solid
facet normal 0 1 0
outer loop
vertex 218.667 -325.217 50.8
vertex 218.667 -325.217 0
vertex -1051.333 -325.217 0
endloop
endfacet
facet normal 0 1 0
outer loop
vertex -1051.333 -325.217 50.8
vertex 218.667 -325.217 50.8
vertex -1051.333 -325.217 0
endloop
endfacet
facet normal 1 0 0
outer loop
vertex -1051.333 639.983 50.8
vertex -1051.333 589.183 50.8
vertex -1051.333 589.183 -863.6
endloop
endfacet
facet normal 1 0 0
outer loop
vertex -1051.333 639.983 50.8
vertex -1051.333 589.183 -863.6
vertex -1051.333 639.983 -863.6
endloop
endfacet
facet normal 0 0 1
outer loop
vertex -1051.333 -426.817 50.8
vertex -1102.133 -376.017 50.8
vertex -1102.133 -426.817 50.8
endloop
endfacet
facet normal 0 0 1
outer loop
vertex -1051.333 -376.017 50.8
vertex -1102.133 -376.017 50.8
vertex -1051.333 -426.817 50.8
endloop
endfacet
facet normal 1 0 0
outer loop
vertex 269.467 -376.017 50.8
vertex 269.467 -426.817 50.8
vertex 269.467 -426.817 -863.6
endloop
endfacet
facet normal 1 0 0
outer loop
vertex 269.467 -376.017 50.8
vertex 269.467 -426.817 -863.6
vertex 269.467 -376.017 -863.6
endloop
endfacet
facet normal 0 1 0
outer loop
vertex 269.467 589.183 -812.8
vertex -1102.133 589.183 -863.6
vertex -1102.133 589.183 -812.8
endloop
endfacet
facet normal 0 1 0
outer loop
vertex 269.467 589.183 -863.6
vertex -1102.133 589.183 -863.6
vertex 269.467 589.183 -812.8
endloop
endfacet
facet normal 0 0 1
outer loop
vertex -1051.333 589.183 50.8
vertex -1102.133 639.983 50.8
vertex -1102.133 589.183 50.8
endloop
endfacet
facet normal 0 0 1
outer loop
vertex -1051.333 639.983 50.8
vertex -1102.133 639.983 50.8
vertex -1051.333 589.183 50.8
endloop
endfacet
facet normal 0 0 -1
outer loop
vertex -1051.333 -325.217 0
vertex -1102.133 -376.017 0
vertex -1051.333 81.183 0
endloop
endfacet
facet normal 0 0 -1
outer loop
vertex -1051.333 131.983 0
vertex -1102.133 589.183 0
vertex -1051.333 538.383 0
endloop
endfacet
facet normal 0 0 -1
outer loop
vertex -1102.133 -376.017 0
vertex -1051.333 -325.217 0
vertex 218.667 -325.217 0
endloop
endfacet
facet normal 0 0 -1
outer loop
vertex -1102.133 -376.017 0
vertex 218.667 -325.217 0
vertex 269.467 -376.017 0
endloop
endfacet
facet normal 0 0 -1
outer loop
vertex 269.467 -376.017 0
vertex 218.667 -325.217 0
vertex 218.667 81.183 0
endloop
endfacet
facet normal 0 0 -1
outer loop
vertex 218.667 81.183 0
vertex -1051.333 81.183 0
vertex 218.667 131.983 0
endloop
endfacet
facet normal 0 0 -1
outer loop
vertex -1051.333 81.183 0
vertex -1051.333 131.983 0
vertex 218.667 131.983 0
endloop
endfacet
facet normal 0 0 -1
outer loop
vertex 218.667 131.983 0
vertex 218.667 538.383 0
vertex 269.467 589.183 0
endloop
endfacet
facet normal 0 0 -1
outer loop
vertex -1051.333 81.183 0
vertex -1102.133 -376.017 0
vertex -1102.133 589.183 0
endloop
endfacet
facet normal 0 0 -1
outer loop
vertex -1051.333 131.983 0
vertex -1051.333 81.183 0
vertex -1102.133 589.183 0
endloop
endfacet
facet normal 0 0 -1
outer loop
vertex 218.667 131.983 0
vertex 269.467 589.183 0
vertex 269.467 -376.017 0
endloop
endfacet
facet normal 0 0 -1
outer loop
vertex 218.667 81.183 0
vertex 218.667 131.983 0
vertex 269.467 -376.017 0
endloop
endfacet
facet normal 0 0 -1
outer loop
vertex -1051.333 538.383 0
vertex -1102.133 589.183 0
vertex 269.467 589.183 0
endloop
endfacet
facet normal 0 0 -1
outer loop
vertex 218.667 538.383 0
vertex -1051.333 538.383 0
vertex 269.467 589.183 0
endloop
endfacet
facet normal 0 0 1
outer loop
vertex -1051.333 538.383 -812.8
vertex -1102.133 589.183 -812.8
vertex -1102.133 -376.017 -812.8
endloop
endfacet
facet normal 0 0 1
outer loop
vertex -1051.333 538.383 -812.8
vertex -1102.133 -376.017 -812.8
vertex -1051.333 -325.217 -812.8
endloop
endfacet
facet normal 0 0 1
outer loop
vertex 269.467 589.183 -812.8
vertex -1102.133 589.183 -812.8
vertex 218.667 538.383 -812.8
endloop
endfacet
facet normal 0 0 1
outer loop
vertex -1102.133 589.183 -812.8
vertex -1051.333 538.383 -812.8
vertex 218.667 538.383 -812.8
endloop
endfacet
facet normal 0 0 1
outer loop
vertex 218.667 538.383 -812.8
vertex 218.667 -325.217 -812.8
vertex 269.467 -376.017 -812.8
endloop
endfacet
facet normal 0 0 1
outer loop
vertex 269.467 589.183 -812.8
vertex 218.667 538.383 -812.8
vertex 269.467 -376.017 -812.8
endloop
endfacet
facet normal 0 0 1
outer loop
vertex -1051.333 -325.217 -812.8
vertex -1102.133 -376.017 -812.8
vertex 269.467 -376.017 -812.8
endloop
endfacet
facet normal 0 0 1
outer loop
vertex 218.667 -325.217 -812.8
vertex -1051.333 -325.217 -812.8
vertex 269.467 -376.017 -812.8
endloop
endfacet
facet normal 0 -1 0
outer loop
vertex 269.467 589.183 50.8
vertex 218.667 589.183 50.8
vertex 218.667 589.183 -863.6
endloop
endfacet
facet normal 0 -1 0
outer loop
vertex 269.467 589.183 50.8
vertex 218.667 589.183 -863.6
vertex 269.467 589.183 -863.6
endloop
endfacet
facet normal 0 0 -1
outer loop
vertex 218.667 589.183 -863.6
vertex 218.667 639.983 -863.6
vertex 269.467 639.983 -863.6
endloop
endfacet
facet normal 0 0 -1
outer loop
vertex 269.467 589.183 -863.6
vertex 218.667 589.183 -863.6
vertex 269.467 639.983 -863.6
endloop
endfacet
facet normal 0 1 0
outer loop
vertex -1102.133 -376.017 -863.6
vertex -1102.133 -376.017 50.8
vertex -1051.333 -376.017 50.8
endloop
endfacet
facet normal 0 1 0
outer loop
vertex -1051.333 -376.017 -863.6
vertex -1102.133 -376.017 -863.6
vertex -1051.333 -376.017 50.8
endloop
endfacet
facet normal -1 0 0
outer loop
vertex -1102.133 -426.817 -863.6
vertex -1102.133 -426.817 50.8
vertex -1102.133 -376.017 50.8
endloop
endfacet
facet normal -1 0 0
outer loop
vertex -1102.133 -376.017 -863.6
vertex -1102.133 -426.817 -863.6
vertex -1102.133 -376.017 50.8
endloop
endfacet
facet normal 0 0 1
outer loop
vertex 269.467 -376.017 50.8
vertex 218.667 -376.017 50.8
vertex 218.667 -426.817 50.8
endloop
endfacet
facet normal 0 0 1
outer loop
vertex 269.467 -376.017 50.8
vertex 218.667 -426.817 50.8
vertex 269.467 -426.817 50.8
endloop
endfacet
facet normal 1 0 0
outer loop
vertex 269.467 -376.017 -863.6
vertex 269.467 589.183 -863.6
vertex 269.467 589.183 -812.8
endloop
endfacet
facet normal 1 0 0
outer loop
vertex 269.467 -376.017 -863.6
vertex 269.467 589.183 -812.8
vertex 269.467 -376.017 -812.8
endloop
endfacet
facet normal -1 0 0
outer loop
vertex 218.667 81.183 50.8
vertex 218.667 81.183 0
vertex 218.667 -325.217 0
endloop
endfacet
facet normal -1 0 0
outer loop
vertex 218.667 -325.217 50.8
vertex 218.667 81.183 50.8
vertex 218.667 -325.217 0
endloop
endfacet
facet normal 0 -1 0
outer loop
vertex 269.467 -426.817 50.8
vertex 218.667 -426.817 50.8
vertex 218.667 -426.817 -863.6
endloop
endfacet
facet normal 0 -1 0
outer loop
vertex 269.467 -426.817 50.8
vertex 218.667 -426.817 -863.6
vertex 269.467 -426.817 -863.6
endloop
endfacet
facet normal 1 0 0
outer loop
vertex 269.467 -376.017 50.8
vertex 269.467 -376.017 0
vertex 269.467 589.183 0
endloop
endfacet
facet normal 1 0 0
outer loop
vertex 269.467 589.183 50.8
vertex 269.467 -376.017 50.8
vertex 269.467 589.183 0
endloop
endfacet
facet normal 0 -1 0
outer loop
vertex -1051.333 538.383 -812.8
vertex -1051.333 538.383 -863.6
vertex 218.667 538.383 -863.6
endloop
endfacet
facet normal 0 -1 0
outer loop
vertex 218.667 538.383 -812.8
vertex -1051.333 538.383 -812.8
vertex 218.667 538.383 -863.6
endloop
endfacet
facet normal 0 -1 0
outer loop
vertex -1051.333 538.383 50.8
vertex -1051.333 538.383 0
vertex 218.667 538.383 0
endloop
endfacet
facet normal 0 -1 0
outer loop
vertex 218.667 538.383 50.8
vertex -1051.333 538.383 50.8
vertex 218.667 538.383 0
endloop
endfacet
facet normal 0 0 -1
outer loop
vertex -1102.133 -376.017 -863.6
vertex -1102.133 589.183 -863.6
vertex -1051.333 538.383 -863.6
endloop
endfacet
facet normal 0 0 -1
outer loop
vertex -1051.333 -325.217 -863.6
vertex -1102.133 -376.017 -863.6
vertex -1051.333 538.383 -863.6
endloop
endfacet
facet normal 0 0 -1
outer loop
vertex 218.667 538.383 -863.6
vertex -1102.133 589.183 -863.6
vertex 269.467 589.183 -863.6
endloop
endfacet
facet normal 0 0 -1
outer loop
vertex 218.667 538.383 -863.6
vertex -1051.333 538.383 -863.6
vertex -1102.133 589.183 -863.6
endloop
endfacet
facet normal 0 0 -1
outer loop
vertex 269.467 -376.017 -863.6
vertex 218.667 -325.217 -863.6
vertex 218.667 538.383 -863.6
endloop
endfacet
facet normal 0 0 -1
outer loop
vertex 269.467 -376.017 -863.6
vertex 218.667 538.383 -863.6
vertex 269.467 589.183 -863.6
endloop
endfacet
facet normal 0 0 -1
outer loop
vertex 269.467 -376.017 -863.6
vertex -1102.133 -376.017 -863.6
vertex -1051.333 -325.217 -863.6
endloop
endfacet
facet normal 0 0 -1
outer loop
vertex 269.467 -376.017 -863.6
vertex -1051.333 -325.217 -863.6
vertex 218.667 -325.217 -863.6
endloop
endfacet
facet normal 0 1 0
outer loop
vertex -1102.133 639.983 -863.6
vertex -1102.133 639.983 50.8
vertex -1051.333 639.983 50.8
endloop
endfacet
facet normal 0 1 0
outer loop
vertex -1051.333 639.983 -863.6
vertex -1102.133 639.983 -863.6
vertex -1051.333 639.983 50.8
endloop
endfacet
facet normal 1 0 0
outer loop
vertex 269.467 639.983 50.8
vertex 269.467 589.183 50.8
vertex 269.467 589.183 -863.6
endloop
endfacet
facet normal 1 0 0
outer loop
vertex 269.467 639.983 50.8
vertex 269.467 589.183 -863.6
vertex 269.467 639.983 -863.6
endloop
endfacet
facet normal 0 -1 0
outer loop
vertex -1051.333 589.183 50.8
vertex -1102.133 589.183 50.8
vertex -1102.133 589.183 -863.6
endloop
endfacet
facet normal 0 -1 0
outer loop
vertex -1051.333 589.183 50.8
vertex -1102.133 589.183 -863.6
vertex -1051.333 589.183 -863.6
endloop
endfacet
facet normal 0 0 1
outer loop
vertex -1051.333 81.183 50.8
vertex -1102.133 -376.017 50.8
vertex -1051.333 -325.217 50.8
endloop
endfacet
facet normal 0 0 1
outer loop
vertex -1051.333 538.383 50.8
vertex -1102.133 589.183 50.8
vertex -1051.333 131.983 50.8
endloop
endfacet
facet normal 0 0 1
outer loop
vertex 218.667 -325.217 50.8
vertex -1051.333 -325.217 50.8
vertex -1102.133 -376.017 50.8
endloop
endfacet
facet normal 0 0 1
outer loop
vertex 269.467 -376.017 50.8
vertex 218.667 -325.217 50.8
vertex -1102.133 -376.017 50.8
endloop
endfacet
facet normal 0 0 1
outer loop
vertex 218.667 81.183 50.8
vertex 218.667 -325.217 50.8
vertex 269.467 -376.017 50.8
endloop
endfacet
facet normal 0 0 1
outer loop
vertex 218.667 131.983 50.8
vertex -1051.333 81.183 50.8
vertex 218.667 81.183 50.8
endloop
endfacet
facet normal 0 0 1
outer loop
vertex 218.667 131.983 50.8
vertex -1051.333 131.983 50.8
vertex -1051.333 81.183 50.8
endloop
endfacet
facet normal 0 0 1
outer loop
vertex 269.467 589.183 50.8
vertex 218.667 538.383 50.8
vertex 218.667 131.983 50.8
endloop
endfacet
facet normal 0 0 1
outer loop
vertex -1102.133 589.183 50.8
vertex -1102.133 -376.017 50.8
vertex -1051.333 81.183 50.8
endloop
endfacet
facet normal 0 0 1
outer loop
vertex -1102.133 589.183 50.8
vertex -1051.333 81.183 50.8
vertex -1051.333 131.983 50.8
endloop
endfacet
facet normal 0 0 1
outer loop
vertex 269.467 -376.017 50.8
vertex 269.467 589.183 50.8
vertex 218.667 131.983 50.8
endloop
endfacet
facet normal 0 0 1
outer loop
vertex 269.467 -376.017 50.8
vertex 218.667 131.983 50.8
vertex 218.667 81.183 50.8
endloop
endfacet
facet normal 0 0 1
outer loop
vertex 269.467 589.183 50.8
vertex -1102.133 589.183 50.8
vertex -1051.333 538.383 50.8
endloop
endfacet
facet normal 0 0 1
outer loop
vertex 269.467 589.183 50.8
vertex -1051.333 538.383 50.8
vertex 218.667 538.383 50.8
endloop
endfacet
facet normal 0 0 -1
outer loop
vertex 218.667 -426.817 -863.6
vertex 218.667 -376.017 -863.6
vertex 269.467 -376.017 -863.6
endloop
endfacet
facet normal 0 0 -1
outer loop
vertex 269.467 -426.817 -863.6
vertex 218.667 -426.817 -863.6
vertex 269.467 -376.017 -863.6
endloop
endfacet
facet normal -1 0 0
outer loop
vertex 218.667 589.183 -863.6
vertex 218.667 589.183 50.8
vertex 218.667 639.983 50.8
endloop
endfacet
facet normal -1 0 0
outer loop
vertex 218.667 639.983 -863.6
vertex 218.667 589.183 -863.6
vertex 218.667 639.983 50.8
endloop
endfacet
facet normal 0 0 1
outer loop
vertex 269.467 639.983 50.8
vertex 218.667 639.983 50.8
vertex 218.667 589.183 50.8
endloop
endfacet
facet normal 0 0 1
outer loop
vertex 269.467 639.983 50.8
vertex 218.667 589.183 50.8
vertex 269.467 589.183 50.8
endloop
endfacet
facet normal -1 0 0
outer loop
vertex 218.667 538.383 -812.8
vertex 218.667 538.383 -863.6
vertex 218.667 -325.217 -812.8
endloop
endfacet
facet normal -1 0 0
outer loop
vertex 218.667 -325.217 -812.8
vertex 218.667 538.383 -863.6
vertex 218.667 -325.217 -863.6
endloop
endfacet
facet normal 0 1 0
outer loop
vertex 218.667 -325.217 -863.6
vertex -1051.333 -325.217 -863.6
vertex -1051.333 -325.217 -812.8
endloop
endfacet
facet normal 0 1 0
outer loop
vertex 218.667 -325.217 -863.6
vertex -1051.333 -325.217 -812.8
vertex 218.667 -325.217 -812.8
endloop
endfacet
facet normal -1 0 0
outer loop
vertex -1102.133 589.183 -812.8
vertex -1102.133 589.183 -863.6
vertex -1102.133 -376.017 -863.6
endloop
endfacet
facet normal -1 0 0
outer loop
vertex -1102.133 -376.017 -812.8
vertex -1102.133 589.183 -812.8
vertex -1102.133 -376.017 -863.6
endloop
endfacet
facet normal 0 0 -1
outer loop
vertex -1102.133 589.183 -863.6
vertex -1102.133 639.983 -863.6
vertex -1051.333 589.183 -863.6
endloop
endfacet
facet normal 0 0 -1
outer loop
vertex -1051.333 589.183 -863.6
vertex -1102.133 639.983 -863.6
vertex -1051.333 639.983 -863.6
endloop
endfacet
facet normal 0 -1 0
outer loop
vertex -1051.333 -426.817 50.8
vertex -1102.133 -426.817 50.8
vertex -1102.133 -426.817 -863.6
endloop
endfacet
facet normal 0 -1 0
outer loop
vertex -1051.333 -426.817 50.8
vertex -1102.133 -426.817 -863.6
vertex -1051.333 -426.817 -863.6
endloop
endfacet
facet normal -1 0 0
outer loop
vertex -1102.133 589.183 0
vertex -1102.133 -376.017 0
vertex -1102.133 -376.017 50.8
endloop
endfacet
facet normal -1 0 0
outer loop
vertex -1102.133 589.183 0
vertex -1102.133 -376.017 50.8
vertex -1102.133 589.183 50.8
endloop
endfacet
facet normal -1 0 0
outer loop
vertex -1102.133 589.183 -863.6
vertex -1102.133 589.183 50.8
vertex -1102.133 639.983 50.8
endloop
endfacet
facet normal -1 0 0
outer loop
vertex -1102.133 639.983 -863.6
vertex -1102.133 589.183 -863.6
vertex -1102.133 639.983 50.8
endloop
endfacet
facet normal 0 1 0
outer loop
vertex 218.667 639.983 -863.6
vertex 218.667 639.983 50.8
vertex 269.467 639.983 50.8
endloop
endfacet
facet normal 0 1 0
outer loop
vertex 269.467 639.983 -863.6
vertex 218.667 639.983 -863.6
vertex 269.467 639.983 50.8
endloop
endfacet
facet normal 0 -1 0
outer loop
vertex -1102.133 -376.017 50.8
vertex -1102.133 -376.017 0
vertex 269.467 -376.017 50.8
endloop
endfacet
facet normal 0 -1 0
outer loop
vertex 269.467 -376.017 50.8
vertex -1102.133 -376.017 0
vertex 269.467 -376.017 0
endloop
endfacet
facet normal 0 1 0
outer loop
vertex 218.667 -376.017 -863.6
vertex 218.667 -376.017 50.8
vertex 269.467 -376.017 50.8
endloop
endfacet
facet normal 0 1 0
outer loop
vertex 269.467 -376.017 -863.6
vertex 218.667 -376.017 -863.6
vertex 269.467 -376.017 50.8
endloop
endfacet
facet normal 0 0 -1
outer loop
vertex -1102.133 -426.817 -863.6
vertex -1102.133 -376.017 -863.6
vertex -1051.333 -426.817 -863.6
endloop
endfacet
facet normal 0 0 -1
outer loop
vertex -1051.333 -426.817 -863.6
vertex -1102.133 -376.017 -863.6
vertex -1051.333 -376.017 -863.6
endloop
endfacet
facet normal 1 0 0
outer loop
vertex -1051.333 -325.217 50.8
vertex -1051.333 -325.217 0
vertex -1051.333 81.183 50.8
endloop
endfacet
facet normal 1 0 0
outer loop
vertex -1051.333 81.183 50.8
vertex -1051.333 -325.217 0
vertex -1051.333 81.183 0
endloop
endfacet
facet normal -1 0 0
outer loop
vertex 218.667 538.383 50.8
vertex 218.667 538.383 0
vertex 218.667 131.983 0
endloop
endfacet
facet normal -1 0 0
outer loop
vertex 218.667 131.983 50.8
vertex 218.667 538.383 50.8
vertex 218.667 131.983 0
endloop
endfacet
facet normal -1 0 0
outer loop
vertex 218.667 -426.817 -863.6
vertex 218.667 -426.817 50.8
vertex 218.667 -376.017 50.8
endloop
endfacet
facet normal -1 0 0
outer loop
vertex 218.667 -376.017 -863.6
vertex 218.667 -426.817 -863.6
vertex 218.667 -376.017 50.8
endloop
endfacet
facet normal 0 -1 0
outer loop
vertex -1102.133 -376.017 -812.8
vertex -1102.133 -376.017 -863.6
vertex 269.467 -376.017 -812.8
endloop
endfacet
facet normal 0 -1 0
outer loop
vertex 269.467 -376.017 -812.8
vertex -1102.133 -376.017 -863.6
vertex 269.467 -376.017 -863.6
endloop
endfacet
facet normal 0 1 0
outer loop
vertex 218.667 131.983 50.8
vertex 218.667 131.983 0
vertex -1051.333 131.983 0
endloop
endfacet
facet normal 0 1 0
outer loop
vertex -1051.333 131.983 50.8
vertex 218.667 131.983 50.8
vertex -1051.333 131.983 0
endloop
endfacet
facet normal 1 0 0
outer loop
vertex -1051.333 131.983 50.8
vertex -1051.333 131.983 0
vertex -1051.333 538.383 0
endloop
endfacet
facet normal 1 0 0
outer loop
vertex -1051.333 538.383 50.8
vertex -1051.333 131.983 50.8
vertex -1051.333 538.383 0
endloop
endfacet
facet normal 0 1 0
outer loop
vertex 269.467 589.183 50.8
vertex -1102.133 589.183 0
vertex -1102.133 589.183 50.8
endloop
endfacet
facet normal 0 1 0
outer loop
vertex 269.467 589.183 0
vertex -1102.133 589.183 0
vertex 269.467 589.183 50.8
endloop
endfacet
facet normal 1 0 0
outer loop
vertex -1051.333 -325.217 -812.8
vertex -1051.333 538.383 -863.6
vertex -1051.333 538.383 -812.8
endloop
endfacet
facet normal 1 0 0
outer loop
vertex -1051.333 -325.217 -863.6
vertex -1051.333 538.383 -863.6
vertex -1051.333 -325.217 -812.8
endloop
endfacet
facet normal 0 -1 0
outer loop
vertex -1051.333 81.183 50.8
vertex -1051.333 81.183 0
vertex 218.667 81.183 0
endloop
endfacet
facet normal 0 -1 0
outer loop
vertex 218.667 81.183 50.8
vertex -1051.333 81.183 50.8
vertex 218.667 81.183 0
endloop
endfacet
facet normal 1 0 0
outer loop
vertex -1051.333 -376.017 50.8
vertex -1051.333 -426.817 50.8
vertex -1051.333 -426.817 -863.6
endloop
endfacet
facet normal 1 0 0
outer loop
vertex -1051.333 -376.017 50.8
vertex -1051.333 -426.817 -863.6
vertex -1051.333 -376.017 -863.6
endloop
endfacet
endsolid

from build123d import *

# Parameters (mm, degrees)
F0_W     = 1371.6
F0_H     = 965.2
F0_W_2   = 260.35
F0_H_2   = 25.4
F0_W_3   = 234.95
F0_W_4   = 254
F1_DEPTH = 50.8
F2_W     = 50.8
F2_H     = 50.8
F3_DEPTH = 914.4
F4_W     = 1371.6
F4_H     = 965.2
F4_W_2   = 1270
F4_H_2   = 863.6
F5_DEPTH = 50.8


with BuildPart() as f1:
    # F0 (on Top) → F1 (new body)
    with BuildSketch(Plane.XY):
        with Locations((-416.3326116403, 106.5828682661)):
            Rectangle(F0_W, F0_H)
        Polygon((-816.3826116403, -350.6171317339), (-1076.7326116403, -350.6171317339), (-1076.7326116403, -122.0171317339), (-1076.7326116403, 106.5828682661), (-1076.7326116403, 335.1828682661), (-1076.7326116403, 563.7828682661), (-816.3826116403, 563.7828682661), (-556.0326116403, 563.7828682661), (-295.6826116403, 563.7828682661), (-35.3326116403, 563.7828682661), (244.0673883597, 563.7828682661), (244.0673883597, 335.1828682661), (244.0673883597, 106.5828682661), (244.0673883597, -122.0171317339), (244.0673883597, -350.6171317339), (-35.3326116403, -350.6171317339), (-295.6826116403, -350.6171317339), (-556.0326116403, -350.6171317339), align=None, mode=Mode.SUBTRACT)
        Polygon((-1076.7326116403, -122.0171317339), (-1076.7326116403, -350.6171317339), (-816.3826116403, -350.6171317339), (-816.3826116403, -325.2171317339), (-1051.3326116403, -325.2171317339), (-1051.3326116403, -122.0171317339), (-1051.3326116403, 81.1828682661), (-1051.3326116403, 106.5828682661), (-1051.3326116403, 131.9828682661), (-1051.3326116403, 335.1828682661), (-1051.3326116403, 538.3828682661), (-816.3826116403, 538.3828682661), (-556.0326116403, 538.3828682661), (-295.6826116403, 538.3828682661), (-35.3326116403, 538.3828682661), (218.6673883597, 538.3828682661), (218.6673883597, 335.1828682661), (218.6673883597, 131.9828682661), (218.6673883597, 106.5828682661), (244.0673883597, 106.5828682661), (244.0673883597, 335.1828682661), (244.0673883597, 563.7828682661), (-35.3326116403, 563.7828682661), (-295.6826116403, 563.7828682661), (-556.0326116403, 563.7828682661), (-816.3826116403, 563.7828682661), (-1076.7326116403, 563.7828682661), (-1076.7326116403, 335.1828682661), (-1076.7326116403, 106.5828682661), align=None)
        Polygon((-295.6826116403, -325.2171317339), (-295.6826116403, -350.6171317339), (-35.3326116403, -350.6171317339), (244.0673883597, -350.6171317339), (244.0673883597, -122.0171317339), (244.0673883597, 106.5828682661), (218.6673883597, 106.5828682661), (218.6673883597, 81.1828682661), (218.6673883597, -122.0171317339), (218.6673883597, -325.2171317339), (-35.3326116403, -325.2171317339), align=None)
        with Locations((-425.8576116403, -337.9171317339)):
            Rectangle(F0_W_2, F0_H_2)
        with Locations((-686.2076116403, -337.9171317339)):
            Rectangle(F0_W_2, F0_H_2)
        with Locations((-933.8576116403, 119.2828682661)):
            Rectangle(F0_W_3, F0_H_2)
        with Locations((-686.2076116403, 119.2828682661)):
            Rectangle(F0_W_2, F0_H_2)
        with Locations((-425.8576116403, 119.2828682661)):
            Rectangle(F0_W_2, F0_H_2)
        with Locations((-165.5076116403, 119.2828682661)):
            Rectangle(F0_W_2, F0_H_2)
        with Locations((91.6673883597, 119.2828682661)):
            Rectangle(F0_W_4, F0_H_2)
        with Locations((-933.8576116403, 93.8828682661)):
            Rectangle(F0_W_3, F0_H_2)
        with Locations((-686.2076116403, 93.8828682661)):
            Rectangle(F0_W_2, F0_H_2)
        with Locations((-425.8576116403, 93.8828682661)):
            Rectangle(F0_W_2, F0_H_2)
        with Locations((-165.5076116403, 93.8828682661)):
            Rectangle(F0_W_2, F0_H_2)
        with Locations((91.6673883597, 93.8828682661)):
            Rectangle(F0_W_4, F0_H_2)
    extrude(amount=F1_DEPTH)


with BuildPart() as f3:
    # F2 (on face) → F3 (new body)
    with BuildSketch(Plane.XY.offset(50.8)):
        with Locations((244.0673883597, 614.5828682661)):
            Rectangle(F2_W, F2_H)
    extrude(amount=-F3_DEPTH)


with BuildPart() as f3b:
    # F2 (on face) → F3, piece 2 (new body)
    with BuildSketch(Plane.XY.offset(50.8)):
        with Locations((-1076.7326116403, -401.4171317339)):
            Rectangle(F2_W, F2_H)
    extrude(amount=-F3_DEPTH)


with BuildPart() as f3c:
    # F2 (on face) → F3, piece 3 (new body)
    with BuildSketch(Plane.XY.offset(50.8)):
        with Locations((244.0673883597, -401.4171317339)):
            Rectangle(F2_W, F2_H)
    extrude(amount=-F3_DEPTH)


with BuildPart() as f3d:
    # F2 (on face) → F3, piece 4 (new body)
    with BuildSketch(Plane.XY.offset(50.8)):
        with Locations((-1076.7326116403, 614.5828682661)):
            Rectangle(F2_W, F2_H)
    extrude(amount=-F3_DEPTH)


with BuildPart() as f5:
    # F4 (on face) → F5 (new body)
    with BuildSketch(Plane(origin=(0, 0, -863.6), x_dir=(1, 0, 0), z_dir=(0, 0, -1))):
        with Locations((-416.3326116403, -106.5828682661)):
            Rectangle(F4_W, F4_H)
        with Locations((-416.3326116403, -106.5828682661)):
            Rectangle(F4_W_2, F4_H_2, mode=Mode.SUBTRACT)
    extrude(amount=-F5_DEPTH)


solid = Compound([f1.part, f3.part, f3b.part, f3c.part, f3d.part, f5.part])
